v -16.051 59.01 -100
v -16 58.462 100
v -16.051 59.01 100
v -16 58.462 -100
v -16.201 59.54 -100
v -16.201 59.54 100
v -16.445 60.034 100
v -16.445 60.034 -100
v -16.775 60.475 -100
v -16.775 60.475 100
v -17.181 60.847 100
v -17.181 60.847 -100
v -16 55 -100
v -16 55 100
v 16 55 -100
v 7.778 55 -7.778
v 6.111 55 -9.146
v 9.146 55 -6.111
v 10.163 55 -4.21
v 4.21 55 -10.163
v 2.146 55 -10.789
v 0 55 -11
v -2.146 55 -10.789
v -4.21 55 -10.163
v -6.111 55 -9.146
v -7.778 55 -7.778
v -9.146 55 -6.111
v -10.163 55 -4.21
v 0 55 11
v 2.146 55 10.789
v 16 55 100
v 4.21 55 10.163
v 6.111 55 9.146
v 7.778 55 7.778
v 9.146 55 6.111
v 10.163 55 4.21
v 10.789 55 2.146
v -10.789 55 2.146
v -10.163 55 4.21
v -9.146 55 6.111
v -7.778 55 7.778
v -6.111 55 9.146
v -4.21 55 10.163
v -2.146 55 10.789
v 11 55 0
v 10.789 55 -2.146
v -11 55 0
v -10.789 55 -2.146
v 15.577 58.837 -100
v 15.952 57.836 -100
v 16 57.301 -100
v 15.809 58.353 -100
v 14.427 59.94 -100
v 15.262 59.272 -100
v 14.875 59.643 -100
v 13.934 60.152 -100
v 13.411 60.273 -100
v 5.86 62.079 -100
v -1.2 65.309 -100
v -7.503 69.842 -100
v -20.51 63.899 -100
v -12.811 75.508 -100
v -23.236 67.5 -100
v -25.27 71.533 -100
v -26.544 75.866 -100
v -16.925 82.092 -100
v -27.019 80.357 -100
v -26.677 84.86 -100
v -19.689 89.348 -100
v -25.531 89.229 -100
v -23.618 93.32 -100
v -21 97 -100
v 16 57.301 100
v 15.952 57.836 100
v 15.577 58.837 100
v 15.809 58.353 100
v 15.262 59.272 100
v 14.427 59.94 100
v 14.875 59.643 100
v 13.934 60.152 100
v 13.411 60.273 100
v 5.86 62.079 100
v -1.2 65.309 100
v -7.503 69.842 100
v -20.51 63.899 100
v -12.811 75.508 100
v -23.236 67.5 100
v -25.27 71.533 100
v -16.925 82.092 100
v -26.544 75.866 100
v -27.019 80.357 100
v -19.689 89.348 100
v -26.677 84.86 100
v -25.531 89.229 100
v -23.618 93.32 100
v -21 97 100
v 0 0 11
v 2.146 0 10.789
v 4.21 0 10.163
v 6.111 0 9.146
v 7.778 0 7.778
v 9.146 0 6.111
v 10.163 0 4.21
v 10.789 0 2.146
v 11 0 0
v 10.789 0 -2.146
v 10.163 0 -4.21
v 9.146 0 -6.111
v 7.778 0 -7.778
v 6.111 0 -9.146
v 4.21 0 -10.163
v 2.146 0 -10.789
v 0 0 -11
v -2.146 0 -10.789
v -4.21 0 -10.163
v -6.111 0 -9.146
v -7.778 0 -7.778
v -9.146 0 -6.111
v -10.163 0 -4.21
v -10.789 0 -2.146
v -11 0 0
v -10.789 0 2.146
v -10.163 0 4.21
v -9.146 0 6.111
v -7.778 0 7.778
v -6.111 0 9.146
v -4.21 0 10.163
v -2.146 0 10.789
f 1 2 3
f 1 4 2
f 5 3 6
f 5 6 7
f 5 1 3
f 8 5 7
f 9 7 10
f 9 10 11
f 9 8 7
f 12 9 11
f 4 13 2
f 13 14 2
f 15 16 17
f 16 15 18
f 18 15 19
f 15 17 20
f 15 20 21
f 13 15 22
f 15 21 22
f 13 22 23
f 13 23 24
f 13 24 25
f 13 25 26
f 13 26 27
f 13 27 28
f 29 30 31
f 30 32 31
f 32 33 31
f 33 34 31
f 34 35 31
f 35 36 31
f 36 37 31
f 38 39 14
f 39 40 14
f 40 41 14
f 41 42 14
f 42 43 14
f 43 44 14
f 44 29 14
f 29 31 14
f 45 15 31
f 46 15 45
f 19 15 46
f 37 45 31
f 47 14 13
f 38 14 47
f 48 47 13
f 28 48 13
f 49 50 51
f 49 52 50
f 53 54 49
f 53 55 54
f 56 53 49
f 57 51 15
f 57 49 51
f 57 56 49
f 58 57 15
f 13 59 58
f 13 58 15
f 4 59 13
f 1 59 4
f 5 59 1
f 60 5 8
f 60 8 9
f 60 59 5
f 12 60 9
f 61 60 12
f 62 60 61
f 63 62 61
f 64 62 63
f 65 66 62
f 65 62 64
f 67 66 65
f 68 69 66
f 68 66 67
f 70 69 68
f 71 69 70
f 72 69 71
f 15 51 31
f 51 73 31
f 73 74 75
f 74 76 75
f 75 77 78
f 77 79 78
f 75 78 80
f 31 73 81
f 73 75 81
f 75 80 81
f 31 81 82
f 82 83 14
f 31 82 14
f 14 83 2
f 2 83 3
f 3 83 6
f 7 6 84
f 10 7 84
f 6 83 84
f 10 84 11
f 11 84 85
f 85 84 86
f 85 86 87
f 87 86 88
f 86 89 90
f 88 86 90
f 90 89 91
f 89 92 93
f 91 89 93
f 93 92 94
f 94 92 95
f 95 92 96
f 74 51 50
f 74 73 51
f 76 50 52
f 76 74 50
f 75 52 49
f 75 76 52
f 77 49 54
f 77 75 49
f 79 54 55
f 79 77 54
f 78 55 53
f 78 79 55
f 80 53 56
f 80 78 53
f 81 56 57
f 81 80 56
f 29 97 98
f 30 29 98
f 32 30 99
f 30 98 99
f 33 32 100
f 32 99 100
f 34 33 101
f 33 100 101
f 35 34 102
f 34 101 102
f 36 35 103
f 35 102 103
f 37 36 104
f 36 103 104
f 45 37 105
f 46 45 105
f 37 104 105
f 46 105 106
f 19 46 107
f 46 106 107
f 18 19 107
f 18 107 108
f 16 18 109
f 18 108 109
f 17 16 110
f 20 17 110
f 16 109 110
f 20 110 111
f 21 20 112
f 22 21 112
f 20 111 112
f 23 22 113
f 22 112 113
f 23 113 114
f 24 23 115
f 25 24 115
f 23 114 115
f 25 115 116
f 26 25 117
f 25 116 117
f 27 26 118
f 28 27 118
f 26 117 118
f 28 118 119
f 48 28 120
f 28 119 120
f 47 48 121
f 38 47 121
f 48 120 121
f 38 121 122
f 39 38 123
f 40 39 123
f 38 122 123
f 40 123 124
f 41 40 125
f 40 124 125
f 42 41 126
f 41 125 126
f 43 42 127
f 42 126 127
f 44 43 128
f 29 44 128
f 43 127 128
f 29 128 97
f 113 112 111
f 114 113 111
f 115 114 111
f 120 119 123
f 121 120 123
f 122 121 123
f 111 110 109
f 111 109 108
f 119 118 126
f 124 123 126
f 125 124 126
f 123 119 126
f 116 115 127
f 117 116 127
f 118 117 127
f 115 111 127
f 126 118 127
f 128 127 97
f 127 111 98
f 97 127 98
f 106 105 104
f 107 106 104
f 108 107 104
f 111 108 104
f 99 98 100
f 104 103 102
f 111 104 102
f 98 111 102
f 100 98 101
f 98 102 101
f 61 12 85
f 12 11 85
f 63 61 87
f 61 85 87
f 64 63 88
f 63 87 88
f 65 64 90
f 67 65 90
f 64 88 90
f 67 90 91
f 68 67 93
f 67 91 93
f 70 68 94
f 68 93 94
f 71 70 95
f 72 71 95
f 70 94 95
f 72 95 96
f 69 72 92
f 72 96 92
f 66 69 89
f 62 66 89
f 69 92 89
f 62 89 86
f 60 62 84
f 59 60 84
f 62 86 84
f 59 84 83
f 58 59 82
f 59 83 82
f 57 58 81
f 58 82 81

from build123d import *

# Parameters (mm, degrees)
SKETCH1_R           = 11
BOSS_EXTRUDE1_DEPTH = 55
BOSS_EXTRUDE2_DEPTH = 100
FILLET1_R           = 3


with BuildPart() as part:
    # Sketch1 → Boss-Extrude1 (new body)
    with BuildSketch(Plane(origin=(0, 0, 0), x_dir=(1, 0, 0), z_dir=(0, 1, 0))):
        with Locations(Location((0, 0, 0), (0, 0, 270))):
            Circle(SKETCH1_R)
    extrude(amount=BOSS_EXTRUDE1_DEPTH)

    # Sketch2 → Boss-Extrude2 (add, symmetric)
    with BuildSketch(Plane.XY):
        with BuildLine():
            Line((16, 55), (-16, 55))
            Line((-16, 55), (-16, 60))
            ThreePointArc((-16, 60), (-26.796302084, 77.378878097), (-21, 97))
            ThreePointArc((-21, 97), (-9.389178352, 71.610821648), (16, 60))
            Line((16, 60), (16, 55))
        make_face()
    extrude(amount=BOSS_EXTRUDE2_DEPTH, both=True)

    # Fillet1
    fillet1_edges = [part.edges().sort_by_distance(p)[0] for p in [
        (16, 60, 0),
        (-16, 60, 0),
    ]]
    fillet(fillet1_edges, radius=FILLET1_R)


solid = part.part
